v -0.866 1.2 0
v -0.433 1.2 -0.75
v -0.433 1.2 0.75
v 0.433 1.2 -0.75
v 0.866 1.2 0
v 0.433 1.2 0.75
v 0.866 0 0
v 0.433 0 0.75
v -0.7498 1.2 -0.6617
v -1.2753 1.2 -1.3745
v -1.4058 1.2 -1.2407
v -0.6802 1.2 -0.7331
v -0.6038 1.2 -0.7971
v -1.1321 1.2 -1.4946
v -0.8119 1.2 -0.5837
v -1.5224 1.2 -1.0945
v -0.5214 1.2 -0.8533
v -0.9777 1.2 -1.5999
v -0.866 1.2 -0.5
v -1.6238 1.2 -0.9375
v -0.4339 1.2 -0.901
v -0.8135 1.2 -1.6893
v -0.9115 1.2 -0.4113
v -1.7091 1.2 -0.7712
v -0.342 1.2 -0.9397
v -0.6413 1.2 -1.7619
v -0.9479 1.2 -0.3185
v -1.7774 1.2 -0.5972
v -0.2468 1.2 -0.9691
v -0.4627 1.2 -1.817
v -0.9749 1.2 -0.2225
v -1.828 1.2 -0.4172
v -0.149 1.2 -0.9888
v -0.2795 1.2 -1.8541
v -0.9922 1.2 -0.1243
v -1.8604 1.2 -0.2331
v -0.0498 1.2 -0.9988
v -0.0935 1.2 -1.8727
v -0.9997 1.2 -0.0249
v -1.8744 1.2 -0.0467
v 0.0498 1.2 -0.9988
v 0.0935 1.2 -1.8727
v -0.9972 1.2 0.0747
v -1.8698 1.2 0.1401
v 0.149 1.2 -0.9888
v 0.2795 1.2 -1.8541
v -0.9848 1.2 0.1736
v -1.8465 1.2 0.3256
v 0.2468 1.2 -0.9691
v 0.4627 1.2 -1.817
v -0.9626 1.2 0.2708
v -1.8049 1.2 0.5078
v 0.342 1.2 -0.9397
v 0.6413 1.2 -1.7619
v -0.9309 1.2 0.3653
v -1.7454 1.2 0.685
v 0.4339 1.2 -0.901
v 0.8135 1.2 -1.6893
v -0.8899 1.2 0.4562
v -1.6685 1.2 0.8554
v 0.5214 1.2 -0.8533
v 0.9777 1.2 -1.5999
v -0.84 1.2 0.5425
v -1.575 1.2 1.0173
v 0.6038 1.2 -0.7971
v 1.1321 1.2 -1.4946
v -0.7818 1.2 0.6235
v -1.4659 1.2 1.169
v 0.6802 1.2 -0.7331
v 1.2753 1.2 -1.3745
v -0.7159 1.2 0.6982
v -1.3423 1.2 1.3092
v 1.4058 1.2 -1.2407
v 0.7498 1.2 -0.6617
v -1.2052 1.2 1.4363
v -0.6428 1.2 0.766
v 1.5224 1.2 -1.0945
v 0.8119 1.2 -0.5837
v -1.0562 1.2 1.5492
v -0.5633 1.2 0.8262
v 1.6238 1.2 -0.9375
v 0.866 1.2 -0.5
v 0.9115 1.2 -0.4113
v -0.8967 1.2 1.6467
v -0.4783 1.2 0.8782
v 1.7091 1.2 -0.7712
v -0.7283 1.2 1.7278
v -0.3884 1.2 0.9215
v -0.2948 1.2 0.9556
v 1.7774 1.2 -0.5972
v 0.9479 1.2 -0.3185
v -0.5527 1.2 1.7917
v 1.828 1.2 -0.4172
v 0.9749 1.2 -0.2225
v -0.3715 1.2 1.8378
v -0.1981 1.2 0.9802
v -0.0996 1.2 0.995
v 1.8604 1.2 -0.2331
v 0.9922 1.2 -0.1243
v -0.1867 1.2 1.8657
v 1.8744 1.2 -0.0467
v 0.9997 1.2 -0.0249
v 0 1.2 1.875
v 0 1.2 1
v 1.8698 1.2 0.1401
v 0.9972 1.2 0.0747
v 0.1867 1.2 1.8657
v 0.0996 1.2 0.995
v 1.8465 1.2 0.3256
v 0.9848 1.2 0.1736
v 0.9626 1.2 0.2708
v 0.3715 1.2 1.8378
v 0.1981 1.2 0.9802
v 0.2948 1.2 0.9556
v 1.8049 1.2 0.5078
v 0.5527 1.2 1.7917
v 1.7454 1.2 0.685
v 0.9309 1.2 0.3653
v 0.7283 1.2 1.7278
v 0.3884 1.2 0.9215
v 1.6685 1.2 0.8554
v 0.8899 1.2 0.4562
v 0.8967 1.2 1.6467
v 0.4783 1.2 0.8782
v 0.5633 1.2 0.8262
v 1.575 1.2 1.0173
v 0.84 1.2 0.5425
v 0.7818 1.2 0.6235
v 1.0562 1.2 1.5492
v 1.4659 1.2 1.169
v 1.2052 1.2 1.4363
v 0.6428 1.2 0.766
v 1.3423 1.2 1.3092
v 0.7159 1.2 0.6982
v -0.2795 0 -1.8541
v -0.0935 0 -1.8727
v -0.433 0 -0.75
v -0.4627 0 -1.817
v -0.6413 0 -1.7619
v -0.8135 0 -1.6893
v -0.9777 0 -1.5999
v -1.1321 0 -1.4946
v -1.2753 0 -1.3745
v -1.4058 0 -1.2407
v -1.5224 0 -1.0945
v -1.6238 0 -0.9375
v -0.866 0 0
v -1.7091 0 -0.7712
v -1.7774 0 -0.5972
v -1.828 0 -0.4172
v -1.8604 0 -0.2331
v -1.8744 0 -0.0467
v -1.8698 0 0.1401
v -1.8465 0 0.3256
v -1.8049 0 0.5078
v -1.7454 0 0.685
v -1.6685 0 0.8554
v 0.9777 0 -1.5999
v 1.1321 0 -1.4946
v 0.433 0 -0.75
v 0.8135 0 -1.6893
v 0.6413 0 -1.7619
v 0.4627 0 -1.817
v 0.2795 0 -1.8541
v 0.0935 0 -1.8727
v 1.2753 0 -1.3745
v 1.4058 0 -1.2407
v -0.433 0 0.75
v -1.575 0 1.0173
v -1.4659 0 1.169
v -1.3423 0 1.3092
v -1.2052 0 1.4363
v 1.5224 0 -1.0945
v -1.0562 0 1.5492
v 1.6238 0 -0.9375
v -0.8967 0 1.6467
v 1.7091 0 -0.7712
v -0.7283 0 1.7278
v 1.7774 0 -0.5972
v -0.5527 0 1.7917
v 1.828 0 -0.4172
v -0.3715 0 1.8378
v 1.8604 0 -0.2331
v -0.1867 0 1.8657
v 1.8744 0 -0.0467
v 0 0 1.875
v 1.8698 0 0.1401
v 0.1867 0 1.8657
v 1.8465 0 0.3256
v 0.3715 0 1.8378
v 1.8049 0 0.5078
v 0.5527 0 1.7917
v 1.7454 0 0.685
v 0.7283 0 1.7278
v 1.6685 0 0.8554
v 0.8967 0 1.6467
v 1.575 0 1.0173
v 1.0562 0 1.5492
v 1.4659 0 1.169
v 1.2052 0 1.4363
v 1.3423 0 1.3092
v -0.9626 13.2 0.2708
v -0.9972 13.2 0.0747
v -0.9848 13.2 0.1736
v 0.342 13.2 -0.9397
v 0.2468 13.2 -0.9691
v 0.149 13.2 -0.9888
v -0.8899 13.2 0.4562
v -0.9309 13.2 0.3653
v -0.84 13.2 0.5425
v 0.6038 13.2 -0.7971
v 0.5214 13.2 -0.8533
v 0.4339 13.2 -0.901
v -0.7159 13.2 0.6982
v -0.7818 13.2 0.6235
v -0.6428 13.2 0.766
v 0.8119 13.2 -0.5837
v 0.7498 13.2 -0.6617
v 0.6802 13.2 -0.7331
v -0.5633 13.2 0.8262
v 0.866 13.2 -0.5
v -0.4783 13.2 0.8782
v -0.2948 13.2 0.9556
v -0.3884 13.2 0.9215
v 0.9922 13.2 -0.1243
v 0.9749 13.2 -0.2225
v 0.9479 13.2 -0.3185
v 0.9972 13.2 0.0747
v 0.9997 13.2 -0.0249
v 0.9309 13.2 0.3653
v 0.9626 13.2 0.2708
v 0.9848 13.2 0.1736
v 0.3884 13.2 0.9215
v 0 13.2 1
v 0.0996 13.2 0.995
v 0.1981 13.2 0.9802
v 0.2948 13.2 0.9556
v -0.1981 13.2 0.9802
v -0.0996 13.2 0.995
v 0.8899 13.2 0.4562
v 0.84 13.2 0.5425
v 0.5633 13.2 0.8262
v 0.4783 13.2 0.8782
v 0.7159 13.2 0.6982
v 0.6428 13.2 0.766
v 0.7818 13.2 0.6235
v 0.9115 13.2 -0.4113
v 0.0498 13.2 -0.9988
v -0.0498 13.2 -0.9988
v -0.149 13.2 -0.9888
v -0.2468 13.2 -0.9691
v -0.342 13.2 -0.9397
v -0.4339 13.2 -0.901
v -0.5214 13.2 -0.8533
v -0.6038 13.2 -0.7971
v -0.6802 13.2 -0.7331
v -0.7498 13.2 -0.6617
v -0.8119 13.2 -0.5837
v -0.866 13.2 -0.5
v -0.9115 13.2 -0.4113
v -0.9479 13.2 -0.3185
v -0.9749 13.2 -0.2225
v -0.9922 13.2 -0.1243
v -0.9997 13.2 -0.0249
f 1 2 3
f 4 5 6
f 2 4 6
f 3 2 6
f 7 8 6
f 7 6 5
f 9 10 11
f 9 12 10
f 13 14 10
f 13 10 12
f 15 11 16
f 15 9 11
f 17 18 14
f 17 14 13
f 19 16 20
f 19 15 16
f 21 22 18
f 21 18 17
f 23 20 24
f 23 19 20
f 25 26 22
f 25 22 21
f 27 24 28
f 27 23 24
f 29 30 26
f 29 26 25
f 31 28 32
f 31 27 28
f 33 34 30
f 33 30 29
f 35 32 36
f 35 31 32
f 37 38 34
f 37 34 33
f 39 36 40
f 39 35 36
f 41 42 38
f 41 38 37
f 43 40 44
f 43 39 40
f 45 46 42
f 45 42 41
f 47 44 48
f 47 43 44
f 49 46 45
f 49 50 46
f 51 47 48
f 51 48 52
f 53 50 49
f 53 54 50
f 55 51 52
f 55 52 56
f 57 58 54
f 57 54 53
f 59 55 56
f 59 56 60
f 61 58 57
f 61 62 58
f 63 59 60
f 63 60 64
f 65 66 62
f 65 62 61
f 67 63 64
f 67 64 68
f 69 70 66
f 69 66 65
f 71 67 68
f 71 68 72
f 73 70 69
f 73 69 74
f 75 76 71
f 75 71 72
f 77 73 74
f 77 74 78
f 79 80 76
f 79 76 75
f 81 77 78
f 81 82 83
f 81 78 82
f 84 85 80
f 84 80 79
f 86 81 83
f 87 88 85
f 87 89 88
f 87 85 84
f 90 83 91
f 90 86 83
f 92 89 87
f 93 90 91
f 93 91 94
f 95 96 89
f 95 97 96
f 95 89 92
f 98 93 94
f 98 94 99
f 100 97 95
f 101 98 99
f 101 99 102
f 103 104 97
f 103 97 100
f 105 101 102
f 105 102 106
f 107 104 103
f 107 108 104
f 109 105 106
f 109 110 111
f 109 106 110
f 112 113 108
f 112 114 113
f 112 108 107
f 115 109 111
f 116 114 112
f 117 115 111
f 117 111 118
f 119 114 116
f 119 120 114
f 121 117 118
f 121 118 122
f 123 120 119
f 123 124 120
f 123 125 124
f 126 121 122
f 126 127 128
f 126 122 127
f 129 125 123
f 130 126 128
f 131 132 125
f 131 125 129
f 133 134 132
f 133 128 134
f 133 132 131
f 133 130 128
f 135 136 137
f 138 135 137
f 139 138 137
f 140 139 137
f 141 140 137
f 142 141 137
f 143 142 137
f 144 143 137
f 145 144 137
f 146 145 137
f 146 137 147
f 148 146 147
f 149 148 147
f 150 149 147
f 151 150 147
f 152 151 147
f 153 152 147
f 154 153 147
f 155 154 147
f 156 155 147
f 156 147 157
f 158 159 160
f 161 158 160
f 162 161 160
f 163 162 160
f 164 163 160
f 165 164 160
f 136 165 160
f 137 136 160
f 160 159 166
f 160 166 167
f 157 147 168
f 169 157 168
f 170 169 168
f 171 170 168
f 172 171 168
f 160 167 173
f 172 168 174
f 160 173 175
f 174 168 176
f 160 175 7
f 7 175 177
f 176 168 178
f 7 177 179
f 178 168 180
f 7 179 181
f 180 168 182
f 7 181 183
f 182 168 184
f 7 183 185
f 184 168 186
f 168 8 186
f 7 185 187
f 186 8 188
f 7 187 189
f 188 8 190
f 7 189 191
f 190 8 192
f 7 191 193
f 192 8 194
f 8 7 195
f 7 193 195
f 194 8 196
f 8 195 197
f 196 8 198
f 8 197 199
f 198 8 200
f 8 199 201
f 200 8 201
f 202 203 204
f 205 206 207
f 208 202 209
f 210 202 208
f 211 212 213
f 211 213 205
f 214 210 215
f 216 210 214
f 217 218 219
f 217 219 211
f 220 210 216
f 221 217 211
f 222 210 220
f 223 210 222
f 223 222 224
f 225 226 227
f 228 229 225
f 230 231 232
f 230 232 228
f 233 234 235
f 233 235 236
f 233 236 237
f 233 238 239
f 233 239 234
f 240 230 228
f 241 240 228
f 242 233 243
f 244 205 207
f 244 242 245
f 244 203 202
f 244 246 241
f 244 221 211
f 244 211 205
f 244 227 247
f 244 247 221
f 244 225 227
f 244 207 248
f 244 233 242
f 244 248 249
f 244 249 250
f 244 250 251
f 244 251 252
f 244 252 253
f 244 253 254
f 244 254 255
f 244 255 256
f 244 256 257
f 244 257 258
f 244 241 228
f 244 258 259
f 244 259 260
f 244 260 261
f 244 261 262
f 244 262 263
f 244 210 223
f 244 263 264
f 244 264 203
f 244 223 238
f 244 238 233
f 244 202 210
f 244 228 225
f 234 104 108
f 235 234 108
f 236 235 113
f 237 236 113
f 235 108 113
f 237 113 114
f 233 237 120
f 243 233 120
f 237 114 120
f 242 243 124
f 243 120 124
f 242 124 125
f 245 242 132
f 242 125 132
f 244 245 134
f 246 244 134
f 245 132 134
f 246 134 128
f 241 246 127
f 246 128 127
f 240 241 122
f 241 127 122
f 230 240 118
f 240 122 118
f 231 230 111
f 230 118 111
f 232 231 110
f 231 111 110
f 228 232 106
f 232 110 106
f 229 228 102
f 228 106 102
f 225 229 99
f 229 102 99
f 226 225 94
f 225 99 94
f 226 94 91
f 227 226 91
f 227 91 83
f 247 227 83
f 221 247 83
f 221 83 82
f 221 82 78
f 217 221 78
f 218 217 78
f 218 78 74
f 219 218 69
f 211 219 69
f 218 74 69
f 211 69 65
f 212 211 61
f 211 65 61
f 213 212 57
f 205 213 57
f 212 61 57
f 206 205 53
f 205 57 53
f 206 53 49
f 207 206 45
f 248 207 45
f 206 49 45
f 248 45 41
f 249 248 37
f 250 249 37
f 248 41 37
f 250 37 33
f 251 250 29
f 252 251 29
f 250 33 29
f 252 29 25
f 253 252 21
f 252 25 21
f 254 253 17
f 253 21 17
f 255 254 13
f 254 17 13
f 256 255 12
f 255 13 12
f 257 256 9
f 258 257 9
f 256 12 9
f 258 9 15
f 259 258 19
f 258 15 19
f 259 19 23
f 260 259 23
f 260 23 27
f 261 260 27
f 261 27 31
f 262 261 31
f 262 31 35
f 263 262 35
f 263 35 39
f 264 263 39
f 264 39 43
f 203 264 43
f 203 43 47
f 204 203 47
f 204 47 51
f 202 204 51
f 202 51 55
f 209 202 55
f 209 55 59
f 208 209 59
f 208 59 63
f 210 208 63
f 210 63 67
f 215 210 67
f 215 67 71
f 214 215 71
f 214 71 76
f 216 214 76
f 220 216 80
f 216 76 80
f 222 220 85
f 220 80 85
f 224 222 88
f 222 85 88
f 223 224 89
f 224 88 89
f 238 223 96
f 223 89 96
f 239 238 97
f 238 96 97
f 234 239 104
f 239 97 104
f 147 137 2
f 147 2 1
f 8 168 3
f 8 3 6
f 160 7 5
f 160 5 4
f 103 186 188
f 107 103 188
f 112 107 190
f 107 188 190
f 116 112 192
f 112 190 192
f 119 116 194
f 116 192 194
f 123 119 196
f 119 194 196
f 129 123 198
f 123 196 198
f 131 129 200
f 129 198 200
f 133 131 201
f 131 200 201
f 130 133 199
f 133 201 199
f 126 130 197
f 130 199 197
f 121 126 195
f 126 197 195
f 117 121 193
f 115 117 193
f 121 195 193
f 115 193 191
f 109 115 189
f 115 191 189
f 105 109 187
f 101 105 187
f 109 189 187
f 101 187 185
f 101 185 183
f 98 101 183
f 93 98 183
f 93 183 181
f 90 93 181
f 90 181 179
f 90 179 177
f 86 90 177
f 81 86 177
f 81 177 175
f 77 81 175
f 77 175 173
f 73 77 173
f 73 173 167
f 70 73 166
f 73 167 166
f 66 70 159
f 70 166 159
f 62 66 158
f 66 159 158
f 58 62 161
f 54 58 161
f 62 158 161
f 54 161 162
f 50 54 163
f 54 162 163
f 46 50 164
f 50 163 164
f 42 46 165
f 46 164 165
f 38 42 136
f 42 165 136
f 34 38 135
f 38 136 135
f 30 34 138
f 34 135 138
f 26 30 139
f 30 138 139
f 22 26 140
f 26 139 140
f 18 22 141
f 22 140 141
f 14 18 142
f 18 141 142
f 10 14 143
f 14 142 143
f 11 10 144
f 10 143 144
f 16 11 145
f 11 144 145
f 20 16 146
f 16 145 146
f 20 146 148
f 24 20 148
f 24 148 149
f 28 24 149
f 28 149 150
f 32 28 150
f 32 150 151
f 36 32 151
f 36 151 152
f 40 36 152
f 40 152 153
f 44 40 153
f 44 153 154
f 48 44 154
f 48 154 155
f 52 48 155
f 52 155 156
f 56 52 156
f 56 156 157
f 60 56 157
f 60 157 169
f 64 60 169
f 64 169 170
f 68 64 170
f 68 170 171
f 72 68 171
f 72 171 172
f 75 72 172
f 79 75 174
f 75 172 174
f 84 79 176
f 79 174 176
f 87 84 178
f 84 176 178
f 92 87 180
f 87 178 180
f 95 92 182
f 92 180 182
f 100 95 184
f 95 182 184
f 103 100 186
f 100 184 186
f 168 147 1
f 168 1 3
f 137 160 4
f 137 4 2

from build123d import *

# Parameters (mm, degrees)
SKETCH1_R           = 1.875
BOSS_EXTRUDE1_DEPTH = 1.2
SKETCH2_R           = 1
BOSS_EXTRUDE2_DEPTH = 12


with BuildPart() as part:
    # Sketch1 → Boss-Extrude1 (new body)
    with BuildSketch(Plane(origin=(0, 0, 0), x_dir=(1, 0, 0), z_dir=(0, 1, 0))):
        with Locations(Location((0, 0, 0), (0, 0, 270))):
            Circle(SKETCH1_R)
        Polygon((0.866025404, 0), (0.433012702, 0.75), (-0.433012702, 0.75), (-0.866025404, 0), (-0.433012702, -0.75), (0.433012702, -0.75), align=None, mode=Mode.SUBTRACT)
    extrude(amount=BOSS_EXTRUDE1_DEPTH)

    # Sketch2 → Boss-Extrude2 (add)
    with BuildSketch(Plane(origin=(0, 1.2, 0), x_dir=(1, 0, 0), z_dir=(0, 1, 0))):
        with Locations(Location((0, 0, 0), (0, 0, 270))):
            Circle(SKETCH2_R)
    extrude(amount=BOSS_EXTRUDE2_DEPTH)


solid = part.part
